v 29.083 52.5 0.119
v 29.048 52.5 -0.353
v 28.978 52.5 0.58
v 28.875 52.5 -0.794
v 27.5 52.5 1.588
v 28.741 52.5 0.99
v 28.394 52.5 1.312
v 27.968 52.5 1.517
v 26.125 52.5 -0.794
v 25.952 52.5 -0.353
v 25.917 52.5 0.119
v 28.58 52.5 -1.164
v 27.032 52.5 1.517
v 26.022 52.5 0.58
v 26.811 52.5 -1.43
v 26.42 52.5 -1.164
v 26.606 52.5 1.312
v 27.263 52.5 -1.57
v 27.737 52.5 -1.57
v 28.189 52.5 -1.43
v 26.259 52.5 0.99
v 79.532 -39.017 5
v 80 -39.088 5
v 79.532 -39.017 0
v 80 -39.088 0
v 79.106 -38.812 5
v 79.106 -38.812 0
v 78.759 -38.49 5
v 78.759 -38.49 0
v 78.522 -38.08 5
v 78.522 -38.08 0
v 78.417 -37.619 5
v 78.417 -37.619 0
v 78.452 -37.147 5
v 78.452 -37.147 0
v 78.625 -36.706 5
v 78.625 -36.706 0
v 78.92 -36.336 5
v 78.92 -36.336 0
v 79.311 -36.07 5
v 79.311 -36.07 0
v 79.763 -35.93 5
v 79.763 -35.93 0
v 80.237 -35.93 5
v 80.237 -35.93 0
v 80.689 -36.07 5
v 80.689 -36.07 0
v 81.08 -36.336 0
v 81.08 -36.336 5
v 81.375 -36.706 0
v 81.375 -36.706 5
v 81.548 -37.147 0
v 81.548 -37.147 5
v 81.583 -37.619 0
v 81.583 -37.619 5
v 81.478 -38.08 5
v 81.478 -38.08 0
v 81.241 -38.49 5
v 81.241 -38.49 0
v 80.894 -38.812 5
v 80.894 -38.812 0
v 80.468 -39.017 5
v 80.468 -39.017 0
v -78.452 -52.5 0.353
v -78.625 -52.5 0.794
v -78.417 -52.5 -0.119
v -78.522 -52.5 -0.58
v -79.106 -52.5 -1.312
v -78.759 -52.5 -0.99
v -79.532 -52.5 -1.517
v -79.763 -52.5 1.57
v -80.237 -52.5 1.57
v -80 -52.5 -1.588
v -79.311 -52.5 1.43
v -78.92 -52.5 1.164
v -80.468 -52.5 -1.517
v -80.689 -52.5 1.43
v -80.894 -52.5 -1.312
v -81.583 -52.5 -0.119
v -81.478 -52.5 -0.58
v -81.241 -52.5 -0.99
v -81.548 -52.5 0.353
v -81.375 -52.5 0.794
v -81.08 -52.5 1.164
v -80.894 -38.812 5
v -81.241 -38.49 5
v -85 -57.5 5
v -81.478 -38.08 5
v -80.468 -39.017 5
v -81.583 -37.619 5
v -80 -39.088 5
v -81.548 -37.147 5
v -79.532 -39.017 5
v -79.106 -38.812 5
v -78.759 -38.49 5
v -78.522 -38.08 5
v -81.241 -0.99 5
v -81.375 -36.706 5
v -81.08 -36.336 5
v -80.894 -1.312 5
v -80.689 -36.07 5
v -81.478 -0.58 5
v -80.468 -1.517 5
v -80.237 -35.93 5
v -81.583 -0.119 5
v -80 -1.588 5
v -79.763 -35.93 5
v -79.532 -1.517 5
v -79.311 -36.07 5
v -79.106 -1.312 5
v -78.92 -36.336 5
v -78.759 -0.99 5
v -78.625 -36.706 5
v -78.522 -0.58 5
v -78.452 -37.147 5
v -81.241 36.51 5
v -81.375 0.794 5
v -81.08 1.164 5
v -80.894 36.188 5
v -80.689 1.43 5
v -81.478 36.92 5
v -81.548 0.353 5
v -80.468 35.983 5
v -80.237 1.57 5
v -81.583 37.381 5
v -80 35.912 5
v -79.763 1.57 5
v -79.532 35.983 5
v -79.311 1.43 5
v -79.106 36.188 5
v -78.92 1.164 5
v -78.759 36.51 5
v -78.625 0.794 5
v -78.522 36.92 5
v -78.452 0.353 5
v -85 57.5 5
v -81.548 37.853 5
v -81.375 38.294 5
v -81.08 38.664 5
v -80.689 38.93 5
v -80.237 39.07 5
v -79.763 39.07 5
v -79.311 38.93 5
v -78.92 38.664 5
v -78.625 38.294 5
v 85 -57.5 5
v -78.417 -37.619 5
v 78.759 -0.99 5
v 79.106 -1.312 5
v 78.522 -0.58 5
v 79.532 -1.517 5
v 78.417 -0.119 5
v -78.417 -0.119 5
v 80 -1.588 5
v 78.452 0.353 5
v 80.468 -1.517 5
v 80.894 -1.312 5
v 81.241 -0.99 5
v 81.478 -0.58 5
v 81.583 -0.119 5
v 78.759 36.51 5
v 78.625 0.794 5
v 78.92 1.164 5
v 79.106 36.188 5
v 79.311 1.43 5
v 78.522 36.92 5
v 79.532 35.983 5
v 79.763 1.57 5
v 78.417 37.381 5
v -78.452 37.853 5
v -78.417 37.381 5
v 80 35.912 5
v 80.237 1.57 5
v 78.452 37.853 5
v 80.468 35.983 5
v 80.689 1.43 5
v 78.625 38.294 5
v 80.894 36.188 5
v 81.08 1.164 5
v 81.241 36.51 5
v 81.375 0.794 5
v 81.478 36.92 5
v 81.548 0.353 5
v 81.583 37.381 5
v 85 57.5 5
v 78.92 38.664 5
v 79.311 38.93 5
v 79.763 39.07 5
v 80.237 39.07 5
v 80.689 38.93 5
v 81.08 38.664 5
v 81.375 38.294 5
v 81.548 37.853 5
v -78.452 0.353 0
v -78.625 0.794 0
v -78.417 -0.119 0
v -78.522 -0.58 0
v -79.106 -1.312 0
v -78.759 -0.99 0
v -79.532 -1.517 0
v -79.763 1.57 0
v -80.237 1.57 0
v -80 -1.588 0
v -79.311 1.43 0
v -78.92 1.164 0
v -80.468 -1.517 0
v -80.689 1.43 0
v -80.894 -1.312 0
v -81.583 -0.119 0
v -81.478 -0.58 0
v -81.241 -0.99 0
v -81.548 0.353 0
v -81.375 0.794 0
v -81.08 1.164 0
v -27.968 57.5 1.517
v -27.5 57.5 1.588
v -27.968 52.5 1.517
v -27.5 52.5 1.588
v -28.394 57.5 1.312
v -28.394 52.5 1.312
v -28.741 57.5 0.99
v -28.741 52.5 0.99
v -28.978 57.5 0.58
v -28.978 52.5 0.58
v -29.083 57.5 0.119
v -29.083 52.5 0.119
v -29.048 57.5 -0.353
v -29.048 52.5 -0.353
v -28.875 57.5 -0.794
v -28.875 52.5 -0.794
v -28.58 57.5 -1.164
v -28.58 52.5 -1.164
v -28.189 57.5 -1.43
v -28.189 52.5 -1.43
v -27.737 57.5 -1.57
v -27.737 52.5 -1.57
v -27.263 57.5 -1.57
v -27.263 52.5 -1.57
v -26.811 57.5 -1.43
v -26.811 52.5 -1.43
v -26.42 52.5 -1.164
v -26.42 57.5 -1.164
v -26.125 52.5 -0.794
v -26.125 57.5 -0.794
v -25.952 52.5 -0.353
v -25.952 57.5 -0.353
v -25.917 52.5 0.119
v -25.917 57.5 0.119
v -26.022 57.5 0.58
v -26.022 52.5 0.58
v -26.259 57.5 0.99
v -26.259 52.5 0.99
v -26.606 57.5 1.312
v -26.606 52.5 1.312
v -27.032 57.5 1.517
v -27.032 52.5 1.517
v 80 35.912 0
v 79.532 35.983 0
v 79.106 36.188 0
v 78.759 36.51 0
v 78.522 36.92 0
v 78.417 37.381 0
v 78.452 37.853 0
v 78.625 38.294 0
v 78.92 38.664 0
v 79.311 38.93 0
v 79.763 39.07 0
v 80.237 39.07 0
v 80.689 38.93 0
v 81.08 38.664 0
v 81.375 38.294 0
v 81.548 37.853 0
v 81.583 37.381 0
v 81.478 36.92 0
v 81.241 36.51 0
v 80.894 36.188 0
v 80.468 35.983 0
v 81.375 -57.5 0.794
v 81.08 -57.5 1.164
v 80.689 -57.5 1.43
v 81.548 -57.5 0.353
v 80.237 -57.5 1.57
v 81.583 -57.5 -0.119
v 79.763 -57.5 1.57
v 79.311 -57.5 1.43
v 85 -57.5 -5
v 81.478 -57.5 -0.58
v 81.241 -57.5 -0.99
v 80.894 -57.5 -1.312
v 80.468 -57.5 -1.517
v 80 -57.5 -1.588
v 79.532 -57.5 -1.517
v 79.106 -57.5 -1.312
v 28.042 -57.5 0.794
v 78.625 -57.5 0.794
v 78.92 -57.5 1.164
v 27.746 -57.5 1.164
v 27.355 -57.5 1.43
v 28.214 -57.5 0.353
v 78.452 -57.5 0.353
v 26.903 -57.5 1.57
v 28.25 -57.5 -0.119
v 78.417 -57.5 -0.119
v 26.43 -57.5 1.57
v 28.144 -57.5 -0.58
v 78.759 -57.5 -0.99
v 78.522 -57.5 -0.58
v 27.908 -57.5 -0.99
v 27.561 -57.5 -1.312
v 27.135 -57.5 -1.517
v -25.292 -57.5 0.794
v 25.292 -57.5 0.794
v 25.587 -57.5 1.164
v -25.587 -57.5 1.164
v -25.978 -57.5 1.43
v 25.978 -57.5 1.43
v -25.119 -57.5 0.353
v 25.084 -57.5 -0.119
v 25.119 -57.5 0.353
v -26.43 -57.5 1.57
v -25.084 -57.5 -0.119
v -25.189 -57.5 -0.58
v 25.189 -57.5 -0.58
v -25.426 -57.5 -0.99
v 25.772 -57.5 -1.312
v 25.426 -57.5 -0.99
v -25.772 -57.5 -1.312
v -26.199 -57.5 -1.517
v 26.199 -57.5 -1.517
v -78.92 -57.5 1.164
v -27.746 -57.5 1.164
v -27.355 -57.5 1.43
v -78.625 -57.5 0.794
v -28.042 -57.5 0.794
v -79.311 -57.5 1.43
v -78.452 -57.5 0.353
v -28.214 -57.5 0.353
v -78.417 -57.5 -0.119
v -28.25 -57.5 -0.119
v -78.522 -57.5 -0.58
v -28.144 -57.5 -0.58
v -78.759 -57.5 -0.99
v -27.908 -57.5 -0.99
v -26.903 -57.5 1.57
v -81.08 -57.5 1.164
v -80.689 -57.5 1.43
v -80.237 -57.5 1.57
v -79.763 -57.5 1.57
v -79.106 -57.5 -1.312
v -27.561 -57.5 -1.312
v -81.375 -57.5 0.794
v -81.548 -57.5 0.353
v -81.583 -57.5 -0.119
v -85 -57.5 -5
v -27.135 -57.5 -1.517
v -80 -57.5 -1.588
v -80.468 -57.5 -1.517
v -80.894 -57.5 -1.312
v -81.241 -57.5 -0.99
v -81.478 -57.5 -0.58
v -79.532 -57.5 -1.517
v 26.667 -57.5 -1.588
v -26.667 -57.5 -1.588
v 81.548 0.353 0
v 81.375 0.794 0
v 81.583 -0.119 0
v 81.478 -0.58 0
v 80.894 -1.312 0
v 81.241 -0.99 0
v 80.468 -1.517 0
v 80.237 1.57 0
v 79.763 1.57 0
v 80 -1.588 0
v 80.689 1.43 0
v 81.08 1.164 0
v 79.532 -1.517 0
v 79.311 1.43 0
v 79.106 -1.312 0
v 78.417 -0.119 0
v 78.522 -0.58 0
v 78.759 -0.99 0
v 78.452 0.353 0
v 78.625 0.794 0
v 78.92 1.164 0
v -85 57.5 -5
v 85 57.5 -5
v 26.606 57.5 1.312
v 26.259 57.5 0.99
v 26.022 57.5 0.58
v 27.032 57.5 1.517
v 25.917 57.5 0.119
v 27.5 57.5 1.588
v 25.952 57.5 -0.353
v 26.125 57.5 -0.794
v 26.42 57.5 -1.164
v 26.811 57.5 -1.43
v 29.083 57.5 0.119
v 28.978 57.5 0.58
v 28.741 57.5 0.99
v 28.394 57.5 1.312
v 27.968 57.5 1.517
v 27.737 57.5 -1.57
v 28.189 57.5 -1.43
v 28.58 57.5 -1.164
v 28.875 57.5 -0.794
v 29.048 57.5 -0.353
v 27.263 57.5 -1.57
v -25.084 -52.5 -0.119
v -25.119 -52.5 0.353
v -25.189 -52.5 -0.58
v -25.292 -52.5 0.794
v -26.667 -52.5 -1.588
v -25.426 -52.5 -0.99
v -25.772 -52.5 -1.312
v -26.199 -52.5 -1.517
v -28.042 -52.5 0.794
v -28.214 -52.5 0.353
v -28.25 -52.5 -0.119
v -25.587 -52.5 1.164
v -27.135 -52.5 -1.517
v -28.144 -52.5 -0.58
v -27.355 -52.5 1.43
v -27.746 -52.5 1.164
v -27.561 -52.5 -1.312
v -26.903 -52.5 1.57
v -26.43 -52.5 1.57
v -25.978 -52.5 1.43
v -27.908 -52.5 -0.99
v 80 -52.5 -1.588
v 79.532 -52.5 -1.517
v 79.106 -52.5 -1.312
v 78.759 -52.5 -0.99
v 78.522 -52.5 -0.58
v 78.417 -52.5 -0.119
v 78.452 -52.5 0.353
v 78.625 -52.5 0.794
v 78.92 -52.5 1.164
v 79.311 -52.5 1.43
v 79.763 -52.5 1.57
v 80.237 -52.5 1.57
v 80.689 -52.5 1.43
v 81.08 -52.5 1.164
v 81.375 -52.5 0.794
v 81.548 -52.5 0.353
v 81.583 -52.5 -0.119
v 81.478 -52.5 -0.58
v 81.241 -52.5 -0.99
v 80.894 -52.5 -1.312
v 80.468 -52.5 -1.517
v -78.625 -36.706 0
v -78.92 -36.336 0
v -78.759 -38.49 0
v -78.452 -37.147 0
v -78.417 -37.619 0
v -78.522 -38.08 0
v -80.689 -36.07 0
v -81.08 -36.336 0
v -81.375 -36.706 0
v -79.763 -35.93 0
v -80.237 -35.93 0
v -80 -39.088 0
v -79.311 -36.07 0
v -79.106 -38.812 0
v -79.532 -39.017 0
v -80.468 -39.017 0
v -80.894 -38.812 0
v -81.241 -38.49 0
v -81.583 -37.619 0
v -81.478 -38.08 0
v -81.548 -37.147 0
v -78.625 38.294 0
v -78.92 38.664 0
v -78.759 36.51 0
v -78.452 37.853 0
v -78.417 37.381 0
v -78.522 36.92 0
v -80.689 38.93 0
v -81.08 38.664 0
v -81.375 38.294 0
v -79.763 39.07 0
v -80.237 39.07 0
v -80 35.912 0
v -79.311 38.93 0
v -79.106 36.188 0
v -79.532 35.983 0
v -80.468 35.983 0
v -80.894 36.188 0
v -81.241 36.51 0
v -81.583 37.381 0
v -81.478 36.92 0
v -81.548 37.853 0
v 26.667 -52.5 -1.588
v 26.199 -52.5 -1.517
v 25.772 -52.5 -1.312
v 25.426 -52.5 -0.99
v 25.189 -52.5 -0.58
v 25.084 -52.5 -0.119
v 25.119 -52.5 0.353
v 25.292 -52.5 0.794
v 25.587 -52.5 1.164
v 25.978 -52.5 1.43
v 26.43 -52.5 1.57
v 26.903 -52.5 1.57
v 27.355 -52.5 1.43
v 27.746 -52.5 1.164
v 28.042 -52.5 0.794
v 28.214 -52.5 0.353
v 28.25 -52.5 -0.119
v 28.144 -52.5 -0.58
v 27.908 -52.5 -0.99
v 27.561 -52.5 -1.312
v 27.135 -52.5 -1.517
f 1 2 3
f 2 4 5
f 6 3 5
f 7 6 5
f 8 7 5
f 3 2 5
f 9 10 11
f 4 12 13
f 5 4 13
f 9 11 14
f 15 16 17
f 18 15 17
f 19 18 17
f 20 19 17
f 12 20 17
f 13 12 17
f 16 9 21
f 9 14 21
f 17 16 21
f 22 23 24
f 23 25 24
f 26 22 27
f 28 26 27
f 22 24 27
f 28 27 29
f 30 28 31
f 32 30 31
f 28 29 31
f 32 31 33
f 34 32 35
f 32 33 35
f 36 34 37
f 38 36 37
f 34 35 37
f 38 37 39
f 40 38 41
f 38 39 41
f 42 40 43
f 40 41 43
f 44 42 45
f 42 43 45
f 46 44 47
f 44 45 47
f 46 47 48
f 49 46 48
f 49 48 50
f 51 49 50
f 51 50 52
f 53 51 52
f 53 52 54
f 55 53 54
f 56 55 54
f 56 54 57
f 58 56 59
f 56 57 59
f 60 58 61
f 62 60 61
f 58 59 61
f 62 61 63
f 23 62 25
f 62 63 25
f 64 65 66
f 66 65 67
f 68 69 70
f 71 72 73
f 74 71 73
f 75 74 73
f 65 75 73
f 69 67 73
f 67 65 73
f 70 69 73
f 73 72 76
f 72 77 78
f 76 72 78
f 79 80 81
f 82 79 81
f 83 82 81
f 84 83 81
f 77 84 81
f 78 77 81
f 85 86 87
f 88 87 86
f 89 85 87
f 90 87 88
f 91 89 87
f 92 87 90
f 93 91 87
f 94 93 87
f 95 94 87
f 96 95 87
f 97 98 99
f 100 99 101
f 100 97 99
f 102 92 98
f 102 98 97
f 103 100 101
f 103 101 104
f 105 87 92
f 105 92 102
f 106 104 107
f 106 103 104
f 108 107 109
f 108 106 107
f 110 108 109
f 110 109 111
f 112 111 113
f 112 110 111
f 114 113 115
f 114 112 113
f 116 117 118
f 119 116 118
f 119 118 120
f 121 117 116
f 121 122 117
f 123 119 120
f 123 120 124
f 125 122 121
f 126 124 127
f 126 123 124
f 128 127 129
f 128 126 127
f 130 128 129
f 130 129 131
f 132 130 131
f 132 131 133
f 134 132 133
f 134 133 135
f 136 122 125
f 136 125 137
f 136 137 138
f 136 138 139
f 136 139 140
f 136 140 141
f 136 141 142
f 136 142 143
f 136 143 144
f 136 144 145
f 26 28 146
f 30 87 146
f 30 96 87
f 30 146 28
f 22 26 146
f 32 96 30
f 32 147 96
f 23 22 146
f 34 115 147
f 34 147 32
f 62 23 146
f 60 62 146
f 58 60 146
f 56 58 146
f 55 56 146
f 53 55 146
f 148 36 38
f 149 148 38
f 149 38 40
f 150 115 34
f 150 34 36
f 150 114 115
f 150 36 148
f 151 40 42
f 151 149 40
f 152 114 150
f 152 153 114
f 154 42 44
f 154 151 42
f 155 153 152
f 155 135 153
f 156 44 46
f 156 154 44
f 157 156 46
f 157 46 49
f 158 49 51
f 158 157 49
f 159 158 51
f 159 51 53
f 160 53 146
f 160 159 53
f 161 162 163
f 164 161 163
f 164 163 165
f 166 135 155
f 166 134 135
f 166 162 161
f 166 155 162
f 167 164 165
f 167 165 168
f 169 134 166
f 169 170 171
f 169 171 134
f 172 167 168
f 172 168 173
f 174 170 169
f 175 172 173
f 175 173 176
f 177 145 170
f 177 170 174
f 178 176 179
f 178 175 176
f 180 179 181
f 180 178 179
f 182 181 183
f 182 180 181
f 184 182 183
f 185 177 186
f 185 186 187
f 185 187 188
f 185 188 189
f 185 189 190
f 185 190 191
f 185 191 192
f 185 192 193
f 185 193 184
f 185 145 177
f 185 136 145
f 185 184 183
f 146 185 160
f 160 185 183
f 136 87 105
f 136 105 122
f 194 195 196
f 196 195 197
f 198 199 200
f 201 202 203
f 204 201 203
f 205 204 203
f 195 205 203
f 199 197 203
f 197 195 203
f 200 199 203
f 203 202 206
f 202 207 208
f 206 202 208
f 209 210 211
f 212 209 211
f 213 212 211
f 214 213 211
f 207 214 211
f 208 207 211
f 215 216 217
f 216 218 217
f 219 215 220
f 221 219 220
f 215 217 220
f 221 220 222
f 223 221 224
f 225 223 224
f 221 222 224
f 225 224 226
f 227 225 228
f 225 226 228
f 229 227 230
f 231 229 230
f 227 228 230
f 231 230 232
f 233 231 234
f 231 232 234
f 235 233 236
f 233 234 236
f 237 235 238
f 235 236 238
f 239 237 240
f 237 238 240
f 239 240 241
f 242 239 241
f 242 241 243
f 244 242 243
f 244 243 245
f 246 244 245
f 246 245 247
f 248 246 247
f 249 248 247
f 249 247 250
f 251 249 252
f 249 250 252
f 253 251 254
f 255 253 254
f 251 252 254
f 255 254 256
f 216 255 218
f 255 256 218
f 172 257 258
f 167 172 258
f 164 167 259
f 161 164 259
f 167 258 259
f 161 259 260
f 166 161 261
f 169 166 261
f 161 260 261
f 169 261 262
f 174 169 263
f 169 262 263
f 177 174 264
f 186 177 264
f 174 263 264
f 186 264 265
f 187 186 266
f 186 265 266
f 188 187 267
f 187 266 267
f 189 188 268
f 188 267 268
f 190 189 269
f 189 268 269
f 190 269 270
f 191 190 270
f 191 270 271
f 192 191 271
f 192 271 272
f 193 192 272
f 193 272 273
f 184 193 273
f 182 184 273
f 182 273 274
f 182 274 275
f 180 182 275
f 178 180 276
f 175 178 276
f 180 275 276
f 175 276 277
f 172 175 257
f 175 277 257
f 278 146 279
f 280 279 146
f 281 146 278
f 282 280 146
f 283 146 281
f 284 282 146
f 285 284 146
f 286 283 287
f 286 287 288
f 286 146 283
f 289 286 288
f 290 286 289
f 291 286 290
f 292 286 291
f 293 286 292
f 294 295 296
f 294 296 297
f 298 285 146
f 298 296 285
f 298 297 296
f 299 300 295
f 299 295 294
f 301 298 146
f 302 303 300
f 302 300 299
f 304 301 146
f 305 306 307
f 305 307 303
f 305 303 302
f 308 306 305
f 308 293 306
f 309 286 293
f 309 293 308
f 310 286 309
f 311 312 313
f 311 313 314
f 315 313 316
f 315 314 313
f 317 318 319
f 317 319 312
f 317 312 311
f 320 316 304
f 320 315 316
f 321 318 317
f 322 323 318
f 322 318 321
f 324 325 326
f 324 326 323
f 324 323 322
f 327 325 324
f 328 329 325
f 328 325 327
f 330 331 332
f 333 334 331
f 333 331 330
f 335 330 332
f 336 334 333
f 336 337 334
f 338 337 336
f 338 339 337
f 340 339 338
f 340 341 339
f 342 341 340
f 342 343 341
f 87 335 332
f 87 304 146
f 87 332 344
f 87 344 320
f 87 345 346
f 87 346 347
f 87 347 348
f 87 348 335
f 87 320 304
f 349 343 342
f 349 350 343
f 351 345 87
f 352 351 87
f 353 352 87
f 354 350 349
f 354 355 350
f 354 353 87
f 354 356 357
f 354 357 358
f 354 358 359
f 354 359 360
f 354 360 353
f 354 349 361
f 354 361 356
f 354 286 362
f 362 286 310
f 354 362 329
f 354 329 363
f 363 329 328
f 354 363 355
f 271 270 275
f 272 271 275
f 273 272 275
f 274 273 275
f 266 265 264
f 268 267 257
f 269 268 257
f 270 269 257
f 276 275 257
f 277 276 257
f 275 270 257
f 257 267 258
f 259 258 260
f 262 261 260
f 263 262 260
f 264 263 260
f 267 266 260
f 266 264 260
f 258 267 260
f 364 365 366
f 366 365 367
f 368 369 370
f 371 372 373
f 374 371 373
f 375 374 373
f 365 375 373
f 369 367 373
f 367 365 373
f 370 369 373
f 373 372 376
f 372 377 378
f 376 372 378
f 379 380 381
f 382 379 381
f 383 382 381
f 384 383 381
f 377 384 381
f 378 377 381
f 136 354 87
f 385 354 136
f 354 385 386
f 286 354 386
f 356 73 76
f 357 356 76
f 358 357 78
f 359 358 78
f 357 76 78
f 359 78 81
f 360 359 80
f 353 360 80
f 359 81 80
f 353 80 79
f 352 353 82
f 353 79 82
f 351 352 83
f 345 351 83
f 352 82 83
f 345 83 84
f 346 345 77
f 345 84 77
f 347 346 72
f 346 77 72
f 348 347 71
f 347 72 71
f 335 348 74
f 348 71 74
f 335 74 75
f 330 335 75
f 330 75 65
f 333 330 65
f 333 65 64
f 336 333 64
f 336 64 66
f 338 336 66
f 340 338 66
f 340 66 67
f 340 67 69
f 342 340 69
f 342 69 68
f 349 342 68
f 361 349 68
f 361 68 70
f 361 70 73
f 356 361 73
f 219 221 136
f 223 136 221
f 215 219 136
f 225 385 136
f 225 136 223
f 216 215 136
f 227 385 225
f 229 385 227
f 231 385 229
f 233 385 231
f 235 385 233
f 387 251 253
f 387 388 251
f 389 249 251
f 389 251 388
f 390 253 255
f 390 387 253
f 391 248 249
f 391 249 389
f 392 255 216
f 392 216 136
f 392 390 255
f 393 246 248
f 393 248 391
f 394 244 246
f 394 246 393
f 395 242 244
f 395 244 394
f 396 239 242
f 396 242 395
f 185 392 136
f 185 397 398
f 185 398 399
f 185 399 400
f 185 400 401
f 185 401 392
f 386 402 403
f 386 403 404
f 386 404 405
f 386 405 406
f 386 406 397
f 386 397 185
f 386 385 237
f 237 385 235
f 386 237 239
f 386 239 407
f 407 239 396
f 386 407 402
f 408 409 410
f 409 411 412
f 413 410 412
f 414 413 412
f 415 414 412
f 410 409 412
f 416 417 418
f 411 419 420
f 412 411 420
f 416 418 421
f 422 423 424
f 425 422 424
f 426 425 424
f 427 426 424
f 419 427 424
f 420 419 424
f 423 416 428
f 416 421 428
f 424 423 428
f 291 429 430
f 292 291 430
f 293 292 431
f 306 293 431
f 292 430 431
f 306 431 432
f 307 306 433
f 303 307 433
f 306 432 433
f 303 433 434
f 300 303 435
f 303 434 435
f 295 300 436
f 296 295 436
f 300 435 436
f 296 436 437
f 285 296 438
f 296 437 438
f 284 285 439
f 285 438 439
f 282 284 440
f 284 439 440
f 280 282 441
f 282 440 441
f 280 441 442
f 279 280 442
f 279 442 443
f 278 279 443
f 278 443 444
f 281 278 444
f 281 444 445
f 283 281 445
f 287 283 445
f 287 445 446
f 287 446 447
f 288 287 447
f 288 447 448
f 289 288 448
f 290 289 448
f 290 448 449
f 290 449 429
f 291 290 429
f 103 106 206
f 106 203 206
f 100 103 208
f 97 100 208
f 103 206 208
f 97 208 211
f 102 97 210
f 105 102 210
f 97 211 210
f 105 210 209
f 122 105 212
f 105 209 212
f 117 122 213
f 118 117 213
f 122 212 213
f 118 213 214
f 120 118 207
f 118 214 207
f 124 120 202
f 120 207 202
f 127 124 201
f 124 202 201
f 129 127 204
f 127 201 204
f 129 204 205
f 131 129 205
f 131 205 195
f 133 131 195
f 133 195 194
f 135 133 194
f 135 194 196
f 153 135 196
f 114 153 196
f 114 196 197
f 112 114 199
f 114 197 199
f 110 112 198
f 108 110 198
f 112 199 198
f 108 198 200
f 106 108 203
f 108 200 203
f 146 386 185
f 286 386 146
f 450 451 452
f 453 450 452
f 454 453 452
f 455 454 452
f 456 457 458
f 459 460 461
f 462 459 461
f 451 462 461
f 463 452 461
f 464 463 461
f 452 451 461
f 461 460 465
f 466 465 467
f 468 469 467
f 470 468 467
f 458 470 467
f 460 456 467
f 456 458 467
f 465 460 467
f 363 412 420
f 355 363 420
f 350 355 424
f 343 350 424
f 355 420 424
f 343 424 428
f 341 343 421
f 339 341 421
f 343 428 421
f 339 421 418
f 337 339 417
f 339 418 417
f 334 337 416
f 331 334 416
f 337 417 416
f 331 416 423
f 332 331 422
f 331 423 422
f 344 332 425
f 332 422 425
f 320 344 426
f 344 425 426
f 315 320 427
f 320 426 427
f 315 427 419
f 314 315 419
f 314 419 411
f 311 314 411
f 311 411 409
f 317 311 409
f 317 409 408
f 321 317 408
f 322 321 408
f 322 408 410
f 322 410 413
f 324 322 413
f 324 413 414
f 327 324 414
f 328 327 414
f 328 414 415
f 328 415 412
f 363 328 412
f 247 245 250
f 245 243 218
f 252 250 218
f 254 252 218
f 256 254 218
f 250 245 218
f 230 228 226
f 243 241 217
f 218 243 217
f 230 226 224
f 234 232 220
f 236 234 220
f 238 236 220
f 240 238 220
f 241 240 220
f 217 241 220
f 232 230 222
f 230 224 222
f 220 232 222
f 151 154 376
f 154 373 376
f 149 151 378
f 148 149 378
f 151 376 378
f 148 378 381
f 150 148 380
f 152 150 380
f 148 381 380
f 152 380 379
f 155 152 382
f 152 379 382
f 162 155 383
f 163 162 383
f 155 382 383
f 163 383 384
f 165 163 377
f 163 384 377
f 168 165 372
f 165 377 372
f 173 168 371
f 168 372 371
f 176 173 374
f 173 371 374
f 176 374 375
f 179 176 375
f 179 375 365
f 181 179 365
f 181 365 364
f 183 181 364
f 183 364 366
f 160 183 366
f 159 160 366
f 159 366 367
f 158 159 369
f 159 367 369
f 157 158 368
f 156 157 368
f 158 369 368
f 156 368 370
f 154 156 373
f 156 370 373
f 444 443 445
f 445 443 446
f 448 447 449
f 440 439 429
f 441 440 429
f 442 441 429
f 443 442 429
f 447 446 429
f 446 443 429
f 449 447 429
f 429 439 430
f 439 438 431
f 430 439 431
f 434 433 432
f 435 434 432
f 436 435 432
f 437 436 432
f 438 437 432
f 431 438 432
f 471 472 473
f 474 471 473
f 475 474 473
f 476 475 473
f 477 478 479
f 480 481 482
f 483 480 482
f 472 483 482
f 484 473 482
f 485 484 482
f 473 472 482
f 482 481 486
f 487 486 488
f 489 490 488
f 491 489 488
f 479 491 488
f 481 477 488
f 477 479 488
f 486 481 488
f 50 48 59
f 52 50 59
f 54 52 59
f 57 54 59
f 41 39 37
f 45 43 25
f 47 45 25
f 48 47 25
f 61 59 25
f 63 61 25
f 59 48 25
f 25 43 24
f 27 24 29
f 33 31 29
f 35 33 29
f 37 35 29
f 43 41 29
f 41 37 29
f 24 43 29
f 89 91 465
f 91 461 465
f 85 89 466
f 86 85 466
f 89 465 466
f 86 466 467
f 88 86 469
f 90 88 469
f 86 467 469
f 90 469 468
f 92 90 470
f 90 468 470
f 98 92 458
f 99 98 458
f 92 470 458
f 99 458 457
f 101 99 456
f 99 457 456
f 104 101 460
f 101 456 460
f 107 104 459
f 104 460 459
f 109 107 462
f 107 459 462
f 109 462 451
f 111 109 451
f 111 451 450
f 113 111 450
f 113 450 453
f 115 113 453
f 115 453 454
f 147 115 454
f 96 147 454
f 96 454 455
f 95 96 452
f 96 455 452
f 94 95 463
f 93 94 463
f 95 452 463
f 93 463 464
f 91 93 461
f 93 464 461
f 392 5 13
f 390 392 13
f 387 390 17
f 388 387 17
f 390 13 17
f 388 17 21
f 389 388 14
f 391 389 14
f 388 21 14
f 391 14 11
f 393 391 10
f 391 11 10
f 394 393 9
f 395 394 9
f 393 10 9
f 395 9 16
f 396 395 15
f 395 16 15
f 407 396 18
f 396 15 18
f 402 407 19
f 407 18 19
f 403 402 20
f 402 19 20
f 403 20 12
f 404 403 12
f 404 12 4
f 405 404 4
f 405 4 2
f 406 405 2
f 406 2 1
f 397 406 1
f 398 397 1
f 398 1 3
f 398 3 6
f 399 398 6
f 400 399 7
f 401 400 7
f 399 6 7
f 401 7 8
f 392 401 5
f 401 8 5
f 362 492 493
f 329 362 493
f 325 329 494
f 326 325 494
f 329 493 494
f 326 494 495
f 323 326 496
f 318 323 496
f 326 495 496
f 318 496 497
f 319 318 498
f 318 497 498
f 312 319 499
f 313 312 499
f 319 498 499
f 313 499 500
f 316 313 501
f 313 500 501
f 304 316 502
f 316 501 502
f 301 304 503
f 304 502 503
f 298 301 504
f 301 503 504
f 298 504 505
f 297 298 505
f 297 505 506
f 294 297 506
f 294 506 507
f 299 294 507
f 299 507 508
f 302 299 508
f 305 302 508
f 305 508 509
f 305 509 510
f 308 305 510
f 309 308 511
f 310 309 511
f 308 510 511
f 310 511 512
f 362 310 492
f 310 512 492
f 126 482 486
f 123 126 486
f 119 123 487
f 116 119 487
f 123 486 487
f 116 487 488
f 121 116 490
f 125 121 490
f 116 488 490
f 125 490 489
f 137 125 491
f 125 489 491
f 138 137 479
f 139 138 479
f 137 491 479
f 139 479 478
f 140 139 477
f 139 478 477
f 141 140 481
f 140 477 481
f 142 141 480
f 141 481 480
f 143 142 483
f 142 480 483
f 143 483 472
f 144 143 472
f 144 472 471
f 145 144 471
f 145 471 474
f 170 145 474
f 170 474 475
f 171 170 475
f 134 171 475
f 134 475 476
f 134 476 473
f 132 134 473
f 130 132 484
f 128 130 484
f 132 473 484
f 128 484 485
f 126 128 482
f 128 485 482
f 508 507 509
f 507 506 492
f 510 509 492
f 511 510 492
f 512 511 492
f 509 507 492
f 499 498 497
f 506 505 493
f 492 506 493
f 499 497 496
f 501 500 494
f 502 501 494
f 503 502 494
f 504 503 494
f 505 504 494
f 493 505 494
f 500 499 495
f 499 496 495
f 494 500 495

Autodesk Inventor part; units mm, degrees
ref_plane "YZ Plane" through (0, 0, 0) normal (1, 0, 0) x (0, 1, 0)
ref_plane "XZ Plane" through (0, 0, 0) normal (0, 1, 0) x (-1, 0, 0)
ref_plane "XY Plane" through (0, 0, 0) normal (0, 0, 1) x (1, 0, 0)
sketch "Sketch1" plane through (0, 0, 0) normal (0, 0, 1) x (1, 0, 0)
  line L0 (-85, 57.5) -> (85, 57.5)
  line L1 (85, 57.5) -> (85, -57.5)
  line L2 (85, -57.5) -> (-85, -57.5)
  line L3 (-85, -57.5) -> (-85, 57.5)
  line L4 (-85, 57.5) -> (85, -57.5) construction
  line L5 (85, 57.5) -> (-85, -57.5) construction
  point P0 (0, 0)
  dimension "d0" = 170
  dimension "d1" = 115
extrude "Extrusion1" add sketch "Sketch1" along normal mid plane 10
sketch "Sketch2" plane through (0, 0, 5) normal (0, 0, 1) x (1, 0, 0)
  line L0 (-85, 57.5) -> (-85, -57.5) projected
  line L1 (-85, -57.5) -> (85, -57.5) projected
  point P0 (0, 0)
  point P1 (-80, -37.5)
  point P2 (80, -37.5)
  point P3 (-80, 0)
  point P4 (80, 0)
  point P5 (80, 37.5)
  point P6 (-80, 37.5)
  dimension "d4" = 5
  dimension "d5" = 20
  dimension "d11" = 160
  dimension "d55" = 37.5
  dimension "d62" = 37.5
hole "Hole1" at (-80, -37.5, 5) at (-80, 0, 5) at (80, 0, 5) at (80, -37.5, 5) at (-80, 37.5, 5) at (80, 37.5, 5) direction (0, 0, -1) diameter 3.175 depth 5
sketch "Sketch3" plane through (-85, -57.5, 5) normal (0, -1, 0) x (1, 0, 0)
  line L0 (0, 0) -> (0, -10) projected
  line L1 (0, 0) -> (170, 0) projected
  point P0 (85, -5)
  point P1 (5, -5)
  point P2 (58.3333, -5)
  point P3 (111.6667, -5)
  point P4 (165, -5)
  dimension "d21" = 5
  dimension "d22" = 5
  dimension "d25" = 53.3333
hole "Hole2" at (-80, -57.5, 0) at (-26.6667, -57.5, 0) at (26.6667, -57.5, 0) at (80, -57.5, 0) direction (0, 1, 0) diameter 3.175 depth 5
sketch "Sketch4" plane through (-85, 57.5, 5) normal (0, 1, 0) x (1, 0, 0)
  line L0 (0, 10) -> (0, 0) projected
  line L1 (170, 0) -> (0, 0) projected
  line L2 (0, 10) -> (170, 10) projected
  point P0 (85, 5)
  point P1 (112.5, 5)
  point P2 (57.5, 5)
  dimension "d67" = 5
  dimension "d69" = 27.5
  dimension "d72" = 55
hole "Hole3" at (27.5, 57.5, 0) at (-27.5, 57.5, 0) direction (0, -1, 0) diameter 3.175 depth 5
properties part number "back"
